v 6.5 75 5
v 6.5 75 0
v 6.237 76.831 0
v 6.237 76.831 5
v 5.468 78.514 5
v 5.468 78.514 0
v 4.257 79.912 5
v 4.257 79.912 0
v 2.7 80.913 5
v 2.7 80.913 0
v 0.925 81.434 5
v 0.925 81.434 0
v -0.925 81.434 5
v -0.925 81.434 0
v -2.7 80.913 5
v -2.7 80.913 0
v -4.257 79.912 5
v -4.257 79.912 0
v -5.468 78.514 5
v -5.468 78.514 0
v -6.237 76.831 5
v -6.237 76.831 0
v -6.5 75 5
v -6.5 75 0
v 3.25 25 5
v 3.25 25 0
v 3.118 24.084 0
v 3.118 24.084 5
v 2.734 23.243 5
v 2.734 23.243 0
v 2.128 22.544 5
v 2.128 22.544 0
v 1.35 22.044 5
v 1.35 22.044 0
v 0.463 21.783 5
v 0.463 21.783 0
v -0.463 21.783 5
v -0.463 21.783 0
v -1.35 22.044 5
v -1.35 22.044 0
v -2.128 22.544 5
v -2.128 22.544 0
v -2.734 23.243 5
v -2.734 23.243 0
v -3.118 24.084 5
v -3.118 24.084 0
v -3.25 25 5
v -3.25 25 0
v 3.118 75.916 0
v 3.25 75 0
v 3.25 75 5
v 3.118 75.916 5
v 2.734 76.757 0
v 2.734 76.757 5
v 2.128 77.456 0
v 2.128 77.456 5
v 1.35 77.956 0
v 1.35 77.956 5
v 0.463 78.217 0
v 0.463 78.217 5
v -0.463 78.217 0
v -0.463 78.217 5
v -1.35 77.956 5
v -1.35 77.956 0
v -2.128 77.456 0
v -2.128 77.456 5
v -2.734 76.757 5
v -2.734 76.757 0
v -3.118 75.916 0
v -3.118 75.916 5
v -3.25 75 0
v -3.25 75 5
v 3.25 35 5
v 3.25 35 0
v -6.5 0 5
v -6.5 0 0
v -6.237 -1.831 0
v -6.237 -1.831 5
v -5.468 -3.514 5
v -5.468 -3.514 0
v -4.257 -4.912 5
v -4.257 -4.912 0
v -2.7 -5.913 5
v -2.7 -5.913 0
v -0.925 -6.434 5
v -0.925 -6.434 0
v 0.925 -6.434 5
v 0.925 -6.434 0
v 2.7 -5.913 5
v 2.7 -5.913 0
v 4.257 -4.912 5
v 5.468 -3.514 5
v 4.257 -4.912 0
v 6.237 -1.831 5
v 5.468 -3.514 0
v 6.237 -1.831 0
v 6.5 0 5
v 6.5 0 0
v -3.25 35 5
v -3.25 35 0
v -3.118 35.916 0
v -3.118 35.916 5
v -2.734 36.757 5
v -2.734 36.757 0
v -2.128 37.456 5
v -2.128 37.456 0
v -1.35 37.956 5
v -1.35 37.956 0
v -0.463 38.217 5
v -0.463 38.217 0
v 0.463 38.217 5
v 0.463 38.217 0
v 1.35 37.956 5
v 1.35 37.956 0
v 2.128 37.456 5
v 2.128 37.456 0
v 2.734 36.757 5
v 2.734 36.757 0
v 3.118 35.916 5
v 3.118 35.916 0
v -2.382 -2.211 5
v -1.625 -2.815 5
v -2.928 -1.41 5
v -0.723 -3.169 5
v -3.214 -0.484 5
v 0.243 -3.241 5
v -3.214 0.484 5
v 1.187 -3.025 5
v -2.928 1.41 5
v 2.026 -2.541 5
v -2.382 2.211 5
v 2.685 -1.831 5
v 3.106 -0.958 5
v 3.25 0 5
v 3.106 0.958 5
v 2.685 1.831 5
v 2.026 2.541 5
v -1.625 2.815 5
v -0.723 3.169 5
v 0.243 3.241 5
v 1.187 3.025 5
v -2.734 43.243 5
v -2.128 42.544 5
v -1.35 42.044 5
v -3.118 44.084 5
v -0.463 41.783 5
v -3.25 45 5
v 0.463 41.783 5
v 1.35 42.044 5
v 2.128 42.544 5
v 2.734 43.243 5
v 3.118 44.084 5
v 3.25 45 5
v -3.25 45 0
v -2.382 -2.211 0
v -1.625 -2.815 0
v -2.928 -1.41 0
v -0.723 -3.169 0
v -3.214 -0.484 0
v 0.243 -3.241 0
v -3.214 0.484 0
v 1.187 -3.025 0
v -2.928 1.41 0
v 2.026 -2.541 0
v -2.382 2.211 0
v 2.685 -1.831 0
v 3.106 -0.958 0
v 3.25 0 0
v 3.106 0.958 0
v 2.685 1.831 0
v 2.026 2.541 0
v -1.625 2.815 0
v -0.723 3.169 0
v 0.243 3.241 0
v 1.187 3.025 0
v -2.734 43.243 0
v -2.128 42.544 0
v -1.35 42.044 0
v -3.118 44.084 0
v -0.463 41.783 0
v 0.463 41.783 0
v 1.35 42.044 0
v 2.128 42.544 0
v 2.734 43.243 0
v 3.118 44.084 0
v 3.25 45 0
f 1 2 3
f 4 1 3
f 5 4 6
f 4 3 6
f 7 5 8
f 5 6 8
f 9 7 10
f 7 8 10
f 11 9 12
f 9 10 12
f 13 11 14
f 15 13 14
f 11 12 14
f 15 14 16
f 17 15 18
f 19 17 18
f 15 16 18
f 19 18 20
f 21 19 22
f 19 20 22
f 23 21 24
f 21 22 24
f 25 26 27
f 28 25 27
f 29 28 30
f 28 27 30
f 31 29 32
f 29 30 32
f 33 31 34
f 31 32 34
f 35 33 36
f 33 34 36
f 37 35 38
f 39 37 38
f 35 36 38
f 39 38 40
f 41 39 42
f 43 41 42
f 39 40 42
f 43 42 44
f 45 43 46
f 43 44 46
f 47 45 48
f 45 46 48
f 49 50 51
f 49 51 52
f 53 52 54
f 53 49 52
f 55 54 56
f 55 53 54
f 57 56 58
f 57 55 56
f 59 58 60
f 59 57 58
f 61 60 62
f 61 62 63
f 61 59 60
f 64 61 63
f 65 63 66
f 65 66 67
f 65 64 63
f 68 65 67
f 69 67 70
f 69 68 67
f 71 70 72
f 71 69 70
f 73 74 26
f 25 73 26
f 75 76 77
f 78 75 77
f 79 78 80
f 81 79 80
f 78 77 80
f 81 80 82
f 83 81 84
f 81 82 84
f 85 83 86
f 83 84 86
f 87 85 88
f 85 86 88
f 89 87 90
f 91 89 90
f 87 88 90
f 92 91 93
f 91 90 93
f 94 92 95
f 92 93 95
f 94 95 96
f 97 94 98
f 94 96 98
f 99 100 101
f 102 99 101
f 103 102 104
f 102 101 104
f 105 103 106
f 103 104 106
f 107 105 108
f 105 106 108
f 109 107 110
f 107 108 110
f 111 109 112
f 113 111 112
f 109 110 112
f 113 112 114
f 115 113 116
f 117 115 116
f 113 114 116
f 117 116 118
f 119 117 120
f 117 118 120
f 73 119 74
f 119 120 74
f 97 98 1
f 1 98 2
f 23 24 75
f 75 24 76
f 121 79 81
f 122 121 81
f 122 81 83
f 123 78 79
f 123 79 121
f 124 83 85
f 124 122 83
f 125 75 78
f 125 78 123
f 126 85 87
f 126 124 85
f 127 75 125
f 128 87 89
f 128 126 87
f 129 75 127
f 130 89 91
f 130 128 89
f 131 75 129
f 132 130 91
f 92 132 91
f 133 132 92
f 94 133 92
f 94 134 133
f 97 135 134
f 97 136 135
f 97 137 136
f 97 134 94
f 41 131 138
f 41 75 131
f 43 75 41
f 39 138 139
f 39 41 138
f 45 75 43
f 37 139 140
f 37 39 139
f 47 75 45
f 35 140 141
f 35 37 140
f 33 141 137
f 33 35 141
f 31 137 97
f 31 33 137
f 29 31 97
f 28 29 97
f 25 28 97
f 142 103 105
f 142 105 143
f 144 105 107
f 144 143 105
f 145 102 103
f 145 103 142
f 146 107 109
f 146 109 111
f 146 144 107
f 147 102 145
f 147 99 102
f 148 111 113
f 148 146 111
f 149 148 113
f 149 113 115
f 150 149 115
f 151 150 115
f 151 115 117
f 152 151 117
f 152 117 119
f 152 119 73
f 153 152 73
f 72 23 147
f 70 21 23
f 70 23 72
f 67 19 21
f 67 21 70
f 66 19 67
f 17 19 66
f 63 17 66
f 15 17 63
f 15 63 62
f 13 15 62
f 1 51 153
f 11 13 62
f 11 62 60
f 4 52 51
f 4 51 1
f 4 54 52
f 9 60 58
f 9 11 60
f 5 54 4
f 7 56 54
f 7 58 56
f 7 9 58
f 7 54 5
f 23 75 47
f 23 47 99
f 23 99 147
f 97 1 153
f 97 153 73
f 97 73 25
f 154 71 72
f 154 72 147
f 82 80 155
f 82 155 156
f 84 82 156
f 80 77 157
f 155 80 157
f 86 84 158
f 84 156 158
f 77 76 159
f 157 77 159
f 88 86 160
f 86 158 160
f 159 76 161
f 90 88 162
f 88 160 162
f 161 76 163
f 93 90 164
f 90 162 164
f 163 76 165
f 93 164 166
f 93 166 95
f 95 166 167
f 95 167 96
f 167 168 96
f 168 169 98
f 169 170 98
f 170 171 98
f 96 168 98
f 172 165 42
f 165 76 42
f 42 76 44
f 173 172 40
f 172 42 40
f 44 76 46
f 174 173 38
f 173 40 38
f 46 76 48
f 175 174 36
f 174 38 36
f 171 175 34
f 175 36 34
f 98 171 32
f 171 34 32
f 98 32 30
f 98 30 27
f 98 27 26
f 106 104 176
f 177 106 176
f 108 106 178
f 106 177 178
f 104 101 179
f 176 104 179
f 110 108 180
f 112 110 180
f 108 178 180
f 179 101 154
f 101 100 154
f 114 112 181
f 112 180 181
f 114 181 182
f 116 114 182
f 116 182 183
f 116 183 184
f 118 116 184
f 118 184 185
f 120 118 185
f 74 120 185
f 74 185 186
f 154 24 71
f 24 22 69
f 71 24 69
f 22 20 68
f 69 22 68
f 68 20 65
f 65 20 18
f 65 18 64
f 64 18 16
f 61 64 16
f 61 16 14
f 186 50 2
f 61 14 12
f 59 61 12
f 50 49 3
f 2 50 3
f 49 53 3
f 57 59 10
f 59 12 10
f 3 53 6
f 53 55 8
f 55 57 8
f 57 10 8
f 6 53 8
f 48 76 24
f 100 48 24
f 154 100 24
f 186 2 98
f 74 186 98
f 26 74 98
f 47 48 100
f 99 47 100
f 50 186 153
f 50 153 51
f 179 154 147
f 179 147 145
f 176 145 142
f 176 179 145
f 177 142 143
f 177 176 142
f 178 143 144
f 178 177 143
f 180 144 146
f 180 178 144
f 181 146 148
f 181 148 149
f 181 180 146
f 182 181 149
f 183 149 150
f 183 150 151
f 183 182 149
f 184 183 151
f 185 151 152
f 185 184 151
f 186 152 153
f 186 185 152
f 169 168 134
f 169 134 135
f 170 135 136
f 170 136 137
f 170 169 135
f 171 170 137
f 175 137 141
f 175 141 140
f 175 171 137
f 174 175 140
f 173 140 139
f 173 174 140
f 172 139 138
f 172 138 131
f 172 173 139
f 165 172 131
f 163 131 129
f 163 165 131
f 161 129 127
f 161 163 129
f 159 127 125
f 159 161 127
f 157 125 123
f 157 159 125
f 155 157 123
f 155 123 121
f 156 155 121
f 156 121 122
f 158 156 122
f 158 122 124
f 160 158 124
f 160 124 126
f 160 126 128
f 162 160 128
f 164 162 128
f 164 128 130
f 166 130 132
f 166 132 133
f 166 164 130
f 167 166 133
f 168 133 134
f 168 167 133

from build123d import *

# Parameters (mm, degrees)
SKETCH1_R           = 3.25
BOSS_EXTRUDE1_DEPTH = 5


with BuildPart() as part:
    # Sketch1 → Boss-Extrude1 (new body)
    with BuildSketch(Plane.XY):
        with BuildLine():
            Line((-6.5, 75), (-6.5, 0))
            ThreePointArc((-6.5, 0), (0, -6.5), (6.5, 0))
            Line((6.5, 0), (6.5, 75))
            ThreePointArc((6.5, 75), (0, 81.5), (-6.5, 75))
        make_face()
        Circle(SKETCH1_R, mode=Mode.SUBTRACT)
        with BuildLine():
            Line((-3.25, 75), (-3.25, 45))
            ThreePointArc((-3.25, 45), (0, 41.75), (3.25, 45))
            Line((3.25, 45), (3.25, 75))
            ThreePointArc((3.25, 75), (0, 78.25), (-3.25, 75))
        make_face(mode=Mode.SUBTRACT)
        with BuildLine():
            Line((3.25, 35), (3.25, 25))
            ThreePointArc((3.25, 25), (0, 21.75), (-3.25, 25))
            Line((-3.25, 25), (-3.25, 35))
            ThreePointArc((-3.25, 35), (0, 38.25), (3.25, 35))
        make_face(mode=Mode.SUBTRACT)
    extrude(amount=BOSS_EXTRUDE1_DEPTH)


solid = part.part
